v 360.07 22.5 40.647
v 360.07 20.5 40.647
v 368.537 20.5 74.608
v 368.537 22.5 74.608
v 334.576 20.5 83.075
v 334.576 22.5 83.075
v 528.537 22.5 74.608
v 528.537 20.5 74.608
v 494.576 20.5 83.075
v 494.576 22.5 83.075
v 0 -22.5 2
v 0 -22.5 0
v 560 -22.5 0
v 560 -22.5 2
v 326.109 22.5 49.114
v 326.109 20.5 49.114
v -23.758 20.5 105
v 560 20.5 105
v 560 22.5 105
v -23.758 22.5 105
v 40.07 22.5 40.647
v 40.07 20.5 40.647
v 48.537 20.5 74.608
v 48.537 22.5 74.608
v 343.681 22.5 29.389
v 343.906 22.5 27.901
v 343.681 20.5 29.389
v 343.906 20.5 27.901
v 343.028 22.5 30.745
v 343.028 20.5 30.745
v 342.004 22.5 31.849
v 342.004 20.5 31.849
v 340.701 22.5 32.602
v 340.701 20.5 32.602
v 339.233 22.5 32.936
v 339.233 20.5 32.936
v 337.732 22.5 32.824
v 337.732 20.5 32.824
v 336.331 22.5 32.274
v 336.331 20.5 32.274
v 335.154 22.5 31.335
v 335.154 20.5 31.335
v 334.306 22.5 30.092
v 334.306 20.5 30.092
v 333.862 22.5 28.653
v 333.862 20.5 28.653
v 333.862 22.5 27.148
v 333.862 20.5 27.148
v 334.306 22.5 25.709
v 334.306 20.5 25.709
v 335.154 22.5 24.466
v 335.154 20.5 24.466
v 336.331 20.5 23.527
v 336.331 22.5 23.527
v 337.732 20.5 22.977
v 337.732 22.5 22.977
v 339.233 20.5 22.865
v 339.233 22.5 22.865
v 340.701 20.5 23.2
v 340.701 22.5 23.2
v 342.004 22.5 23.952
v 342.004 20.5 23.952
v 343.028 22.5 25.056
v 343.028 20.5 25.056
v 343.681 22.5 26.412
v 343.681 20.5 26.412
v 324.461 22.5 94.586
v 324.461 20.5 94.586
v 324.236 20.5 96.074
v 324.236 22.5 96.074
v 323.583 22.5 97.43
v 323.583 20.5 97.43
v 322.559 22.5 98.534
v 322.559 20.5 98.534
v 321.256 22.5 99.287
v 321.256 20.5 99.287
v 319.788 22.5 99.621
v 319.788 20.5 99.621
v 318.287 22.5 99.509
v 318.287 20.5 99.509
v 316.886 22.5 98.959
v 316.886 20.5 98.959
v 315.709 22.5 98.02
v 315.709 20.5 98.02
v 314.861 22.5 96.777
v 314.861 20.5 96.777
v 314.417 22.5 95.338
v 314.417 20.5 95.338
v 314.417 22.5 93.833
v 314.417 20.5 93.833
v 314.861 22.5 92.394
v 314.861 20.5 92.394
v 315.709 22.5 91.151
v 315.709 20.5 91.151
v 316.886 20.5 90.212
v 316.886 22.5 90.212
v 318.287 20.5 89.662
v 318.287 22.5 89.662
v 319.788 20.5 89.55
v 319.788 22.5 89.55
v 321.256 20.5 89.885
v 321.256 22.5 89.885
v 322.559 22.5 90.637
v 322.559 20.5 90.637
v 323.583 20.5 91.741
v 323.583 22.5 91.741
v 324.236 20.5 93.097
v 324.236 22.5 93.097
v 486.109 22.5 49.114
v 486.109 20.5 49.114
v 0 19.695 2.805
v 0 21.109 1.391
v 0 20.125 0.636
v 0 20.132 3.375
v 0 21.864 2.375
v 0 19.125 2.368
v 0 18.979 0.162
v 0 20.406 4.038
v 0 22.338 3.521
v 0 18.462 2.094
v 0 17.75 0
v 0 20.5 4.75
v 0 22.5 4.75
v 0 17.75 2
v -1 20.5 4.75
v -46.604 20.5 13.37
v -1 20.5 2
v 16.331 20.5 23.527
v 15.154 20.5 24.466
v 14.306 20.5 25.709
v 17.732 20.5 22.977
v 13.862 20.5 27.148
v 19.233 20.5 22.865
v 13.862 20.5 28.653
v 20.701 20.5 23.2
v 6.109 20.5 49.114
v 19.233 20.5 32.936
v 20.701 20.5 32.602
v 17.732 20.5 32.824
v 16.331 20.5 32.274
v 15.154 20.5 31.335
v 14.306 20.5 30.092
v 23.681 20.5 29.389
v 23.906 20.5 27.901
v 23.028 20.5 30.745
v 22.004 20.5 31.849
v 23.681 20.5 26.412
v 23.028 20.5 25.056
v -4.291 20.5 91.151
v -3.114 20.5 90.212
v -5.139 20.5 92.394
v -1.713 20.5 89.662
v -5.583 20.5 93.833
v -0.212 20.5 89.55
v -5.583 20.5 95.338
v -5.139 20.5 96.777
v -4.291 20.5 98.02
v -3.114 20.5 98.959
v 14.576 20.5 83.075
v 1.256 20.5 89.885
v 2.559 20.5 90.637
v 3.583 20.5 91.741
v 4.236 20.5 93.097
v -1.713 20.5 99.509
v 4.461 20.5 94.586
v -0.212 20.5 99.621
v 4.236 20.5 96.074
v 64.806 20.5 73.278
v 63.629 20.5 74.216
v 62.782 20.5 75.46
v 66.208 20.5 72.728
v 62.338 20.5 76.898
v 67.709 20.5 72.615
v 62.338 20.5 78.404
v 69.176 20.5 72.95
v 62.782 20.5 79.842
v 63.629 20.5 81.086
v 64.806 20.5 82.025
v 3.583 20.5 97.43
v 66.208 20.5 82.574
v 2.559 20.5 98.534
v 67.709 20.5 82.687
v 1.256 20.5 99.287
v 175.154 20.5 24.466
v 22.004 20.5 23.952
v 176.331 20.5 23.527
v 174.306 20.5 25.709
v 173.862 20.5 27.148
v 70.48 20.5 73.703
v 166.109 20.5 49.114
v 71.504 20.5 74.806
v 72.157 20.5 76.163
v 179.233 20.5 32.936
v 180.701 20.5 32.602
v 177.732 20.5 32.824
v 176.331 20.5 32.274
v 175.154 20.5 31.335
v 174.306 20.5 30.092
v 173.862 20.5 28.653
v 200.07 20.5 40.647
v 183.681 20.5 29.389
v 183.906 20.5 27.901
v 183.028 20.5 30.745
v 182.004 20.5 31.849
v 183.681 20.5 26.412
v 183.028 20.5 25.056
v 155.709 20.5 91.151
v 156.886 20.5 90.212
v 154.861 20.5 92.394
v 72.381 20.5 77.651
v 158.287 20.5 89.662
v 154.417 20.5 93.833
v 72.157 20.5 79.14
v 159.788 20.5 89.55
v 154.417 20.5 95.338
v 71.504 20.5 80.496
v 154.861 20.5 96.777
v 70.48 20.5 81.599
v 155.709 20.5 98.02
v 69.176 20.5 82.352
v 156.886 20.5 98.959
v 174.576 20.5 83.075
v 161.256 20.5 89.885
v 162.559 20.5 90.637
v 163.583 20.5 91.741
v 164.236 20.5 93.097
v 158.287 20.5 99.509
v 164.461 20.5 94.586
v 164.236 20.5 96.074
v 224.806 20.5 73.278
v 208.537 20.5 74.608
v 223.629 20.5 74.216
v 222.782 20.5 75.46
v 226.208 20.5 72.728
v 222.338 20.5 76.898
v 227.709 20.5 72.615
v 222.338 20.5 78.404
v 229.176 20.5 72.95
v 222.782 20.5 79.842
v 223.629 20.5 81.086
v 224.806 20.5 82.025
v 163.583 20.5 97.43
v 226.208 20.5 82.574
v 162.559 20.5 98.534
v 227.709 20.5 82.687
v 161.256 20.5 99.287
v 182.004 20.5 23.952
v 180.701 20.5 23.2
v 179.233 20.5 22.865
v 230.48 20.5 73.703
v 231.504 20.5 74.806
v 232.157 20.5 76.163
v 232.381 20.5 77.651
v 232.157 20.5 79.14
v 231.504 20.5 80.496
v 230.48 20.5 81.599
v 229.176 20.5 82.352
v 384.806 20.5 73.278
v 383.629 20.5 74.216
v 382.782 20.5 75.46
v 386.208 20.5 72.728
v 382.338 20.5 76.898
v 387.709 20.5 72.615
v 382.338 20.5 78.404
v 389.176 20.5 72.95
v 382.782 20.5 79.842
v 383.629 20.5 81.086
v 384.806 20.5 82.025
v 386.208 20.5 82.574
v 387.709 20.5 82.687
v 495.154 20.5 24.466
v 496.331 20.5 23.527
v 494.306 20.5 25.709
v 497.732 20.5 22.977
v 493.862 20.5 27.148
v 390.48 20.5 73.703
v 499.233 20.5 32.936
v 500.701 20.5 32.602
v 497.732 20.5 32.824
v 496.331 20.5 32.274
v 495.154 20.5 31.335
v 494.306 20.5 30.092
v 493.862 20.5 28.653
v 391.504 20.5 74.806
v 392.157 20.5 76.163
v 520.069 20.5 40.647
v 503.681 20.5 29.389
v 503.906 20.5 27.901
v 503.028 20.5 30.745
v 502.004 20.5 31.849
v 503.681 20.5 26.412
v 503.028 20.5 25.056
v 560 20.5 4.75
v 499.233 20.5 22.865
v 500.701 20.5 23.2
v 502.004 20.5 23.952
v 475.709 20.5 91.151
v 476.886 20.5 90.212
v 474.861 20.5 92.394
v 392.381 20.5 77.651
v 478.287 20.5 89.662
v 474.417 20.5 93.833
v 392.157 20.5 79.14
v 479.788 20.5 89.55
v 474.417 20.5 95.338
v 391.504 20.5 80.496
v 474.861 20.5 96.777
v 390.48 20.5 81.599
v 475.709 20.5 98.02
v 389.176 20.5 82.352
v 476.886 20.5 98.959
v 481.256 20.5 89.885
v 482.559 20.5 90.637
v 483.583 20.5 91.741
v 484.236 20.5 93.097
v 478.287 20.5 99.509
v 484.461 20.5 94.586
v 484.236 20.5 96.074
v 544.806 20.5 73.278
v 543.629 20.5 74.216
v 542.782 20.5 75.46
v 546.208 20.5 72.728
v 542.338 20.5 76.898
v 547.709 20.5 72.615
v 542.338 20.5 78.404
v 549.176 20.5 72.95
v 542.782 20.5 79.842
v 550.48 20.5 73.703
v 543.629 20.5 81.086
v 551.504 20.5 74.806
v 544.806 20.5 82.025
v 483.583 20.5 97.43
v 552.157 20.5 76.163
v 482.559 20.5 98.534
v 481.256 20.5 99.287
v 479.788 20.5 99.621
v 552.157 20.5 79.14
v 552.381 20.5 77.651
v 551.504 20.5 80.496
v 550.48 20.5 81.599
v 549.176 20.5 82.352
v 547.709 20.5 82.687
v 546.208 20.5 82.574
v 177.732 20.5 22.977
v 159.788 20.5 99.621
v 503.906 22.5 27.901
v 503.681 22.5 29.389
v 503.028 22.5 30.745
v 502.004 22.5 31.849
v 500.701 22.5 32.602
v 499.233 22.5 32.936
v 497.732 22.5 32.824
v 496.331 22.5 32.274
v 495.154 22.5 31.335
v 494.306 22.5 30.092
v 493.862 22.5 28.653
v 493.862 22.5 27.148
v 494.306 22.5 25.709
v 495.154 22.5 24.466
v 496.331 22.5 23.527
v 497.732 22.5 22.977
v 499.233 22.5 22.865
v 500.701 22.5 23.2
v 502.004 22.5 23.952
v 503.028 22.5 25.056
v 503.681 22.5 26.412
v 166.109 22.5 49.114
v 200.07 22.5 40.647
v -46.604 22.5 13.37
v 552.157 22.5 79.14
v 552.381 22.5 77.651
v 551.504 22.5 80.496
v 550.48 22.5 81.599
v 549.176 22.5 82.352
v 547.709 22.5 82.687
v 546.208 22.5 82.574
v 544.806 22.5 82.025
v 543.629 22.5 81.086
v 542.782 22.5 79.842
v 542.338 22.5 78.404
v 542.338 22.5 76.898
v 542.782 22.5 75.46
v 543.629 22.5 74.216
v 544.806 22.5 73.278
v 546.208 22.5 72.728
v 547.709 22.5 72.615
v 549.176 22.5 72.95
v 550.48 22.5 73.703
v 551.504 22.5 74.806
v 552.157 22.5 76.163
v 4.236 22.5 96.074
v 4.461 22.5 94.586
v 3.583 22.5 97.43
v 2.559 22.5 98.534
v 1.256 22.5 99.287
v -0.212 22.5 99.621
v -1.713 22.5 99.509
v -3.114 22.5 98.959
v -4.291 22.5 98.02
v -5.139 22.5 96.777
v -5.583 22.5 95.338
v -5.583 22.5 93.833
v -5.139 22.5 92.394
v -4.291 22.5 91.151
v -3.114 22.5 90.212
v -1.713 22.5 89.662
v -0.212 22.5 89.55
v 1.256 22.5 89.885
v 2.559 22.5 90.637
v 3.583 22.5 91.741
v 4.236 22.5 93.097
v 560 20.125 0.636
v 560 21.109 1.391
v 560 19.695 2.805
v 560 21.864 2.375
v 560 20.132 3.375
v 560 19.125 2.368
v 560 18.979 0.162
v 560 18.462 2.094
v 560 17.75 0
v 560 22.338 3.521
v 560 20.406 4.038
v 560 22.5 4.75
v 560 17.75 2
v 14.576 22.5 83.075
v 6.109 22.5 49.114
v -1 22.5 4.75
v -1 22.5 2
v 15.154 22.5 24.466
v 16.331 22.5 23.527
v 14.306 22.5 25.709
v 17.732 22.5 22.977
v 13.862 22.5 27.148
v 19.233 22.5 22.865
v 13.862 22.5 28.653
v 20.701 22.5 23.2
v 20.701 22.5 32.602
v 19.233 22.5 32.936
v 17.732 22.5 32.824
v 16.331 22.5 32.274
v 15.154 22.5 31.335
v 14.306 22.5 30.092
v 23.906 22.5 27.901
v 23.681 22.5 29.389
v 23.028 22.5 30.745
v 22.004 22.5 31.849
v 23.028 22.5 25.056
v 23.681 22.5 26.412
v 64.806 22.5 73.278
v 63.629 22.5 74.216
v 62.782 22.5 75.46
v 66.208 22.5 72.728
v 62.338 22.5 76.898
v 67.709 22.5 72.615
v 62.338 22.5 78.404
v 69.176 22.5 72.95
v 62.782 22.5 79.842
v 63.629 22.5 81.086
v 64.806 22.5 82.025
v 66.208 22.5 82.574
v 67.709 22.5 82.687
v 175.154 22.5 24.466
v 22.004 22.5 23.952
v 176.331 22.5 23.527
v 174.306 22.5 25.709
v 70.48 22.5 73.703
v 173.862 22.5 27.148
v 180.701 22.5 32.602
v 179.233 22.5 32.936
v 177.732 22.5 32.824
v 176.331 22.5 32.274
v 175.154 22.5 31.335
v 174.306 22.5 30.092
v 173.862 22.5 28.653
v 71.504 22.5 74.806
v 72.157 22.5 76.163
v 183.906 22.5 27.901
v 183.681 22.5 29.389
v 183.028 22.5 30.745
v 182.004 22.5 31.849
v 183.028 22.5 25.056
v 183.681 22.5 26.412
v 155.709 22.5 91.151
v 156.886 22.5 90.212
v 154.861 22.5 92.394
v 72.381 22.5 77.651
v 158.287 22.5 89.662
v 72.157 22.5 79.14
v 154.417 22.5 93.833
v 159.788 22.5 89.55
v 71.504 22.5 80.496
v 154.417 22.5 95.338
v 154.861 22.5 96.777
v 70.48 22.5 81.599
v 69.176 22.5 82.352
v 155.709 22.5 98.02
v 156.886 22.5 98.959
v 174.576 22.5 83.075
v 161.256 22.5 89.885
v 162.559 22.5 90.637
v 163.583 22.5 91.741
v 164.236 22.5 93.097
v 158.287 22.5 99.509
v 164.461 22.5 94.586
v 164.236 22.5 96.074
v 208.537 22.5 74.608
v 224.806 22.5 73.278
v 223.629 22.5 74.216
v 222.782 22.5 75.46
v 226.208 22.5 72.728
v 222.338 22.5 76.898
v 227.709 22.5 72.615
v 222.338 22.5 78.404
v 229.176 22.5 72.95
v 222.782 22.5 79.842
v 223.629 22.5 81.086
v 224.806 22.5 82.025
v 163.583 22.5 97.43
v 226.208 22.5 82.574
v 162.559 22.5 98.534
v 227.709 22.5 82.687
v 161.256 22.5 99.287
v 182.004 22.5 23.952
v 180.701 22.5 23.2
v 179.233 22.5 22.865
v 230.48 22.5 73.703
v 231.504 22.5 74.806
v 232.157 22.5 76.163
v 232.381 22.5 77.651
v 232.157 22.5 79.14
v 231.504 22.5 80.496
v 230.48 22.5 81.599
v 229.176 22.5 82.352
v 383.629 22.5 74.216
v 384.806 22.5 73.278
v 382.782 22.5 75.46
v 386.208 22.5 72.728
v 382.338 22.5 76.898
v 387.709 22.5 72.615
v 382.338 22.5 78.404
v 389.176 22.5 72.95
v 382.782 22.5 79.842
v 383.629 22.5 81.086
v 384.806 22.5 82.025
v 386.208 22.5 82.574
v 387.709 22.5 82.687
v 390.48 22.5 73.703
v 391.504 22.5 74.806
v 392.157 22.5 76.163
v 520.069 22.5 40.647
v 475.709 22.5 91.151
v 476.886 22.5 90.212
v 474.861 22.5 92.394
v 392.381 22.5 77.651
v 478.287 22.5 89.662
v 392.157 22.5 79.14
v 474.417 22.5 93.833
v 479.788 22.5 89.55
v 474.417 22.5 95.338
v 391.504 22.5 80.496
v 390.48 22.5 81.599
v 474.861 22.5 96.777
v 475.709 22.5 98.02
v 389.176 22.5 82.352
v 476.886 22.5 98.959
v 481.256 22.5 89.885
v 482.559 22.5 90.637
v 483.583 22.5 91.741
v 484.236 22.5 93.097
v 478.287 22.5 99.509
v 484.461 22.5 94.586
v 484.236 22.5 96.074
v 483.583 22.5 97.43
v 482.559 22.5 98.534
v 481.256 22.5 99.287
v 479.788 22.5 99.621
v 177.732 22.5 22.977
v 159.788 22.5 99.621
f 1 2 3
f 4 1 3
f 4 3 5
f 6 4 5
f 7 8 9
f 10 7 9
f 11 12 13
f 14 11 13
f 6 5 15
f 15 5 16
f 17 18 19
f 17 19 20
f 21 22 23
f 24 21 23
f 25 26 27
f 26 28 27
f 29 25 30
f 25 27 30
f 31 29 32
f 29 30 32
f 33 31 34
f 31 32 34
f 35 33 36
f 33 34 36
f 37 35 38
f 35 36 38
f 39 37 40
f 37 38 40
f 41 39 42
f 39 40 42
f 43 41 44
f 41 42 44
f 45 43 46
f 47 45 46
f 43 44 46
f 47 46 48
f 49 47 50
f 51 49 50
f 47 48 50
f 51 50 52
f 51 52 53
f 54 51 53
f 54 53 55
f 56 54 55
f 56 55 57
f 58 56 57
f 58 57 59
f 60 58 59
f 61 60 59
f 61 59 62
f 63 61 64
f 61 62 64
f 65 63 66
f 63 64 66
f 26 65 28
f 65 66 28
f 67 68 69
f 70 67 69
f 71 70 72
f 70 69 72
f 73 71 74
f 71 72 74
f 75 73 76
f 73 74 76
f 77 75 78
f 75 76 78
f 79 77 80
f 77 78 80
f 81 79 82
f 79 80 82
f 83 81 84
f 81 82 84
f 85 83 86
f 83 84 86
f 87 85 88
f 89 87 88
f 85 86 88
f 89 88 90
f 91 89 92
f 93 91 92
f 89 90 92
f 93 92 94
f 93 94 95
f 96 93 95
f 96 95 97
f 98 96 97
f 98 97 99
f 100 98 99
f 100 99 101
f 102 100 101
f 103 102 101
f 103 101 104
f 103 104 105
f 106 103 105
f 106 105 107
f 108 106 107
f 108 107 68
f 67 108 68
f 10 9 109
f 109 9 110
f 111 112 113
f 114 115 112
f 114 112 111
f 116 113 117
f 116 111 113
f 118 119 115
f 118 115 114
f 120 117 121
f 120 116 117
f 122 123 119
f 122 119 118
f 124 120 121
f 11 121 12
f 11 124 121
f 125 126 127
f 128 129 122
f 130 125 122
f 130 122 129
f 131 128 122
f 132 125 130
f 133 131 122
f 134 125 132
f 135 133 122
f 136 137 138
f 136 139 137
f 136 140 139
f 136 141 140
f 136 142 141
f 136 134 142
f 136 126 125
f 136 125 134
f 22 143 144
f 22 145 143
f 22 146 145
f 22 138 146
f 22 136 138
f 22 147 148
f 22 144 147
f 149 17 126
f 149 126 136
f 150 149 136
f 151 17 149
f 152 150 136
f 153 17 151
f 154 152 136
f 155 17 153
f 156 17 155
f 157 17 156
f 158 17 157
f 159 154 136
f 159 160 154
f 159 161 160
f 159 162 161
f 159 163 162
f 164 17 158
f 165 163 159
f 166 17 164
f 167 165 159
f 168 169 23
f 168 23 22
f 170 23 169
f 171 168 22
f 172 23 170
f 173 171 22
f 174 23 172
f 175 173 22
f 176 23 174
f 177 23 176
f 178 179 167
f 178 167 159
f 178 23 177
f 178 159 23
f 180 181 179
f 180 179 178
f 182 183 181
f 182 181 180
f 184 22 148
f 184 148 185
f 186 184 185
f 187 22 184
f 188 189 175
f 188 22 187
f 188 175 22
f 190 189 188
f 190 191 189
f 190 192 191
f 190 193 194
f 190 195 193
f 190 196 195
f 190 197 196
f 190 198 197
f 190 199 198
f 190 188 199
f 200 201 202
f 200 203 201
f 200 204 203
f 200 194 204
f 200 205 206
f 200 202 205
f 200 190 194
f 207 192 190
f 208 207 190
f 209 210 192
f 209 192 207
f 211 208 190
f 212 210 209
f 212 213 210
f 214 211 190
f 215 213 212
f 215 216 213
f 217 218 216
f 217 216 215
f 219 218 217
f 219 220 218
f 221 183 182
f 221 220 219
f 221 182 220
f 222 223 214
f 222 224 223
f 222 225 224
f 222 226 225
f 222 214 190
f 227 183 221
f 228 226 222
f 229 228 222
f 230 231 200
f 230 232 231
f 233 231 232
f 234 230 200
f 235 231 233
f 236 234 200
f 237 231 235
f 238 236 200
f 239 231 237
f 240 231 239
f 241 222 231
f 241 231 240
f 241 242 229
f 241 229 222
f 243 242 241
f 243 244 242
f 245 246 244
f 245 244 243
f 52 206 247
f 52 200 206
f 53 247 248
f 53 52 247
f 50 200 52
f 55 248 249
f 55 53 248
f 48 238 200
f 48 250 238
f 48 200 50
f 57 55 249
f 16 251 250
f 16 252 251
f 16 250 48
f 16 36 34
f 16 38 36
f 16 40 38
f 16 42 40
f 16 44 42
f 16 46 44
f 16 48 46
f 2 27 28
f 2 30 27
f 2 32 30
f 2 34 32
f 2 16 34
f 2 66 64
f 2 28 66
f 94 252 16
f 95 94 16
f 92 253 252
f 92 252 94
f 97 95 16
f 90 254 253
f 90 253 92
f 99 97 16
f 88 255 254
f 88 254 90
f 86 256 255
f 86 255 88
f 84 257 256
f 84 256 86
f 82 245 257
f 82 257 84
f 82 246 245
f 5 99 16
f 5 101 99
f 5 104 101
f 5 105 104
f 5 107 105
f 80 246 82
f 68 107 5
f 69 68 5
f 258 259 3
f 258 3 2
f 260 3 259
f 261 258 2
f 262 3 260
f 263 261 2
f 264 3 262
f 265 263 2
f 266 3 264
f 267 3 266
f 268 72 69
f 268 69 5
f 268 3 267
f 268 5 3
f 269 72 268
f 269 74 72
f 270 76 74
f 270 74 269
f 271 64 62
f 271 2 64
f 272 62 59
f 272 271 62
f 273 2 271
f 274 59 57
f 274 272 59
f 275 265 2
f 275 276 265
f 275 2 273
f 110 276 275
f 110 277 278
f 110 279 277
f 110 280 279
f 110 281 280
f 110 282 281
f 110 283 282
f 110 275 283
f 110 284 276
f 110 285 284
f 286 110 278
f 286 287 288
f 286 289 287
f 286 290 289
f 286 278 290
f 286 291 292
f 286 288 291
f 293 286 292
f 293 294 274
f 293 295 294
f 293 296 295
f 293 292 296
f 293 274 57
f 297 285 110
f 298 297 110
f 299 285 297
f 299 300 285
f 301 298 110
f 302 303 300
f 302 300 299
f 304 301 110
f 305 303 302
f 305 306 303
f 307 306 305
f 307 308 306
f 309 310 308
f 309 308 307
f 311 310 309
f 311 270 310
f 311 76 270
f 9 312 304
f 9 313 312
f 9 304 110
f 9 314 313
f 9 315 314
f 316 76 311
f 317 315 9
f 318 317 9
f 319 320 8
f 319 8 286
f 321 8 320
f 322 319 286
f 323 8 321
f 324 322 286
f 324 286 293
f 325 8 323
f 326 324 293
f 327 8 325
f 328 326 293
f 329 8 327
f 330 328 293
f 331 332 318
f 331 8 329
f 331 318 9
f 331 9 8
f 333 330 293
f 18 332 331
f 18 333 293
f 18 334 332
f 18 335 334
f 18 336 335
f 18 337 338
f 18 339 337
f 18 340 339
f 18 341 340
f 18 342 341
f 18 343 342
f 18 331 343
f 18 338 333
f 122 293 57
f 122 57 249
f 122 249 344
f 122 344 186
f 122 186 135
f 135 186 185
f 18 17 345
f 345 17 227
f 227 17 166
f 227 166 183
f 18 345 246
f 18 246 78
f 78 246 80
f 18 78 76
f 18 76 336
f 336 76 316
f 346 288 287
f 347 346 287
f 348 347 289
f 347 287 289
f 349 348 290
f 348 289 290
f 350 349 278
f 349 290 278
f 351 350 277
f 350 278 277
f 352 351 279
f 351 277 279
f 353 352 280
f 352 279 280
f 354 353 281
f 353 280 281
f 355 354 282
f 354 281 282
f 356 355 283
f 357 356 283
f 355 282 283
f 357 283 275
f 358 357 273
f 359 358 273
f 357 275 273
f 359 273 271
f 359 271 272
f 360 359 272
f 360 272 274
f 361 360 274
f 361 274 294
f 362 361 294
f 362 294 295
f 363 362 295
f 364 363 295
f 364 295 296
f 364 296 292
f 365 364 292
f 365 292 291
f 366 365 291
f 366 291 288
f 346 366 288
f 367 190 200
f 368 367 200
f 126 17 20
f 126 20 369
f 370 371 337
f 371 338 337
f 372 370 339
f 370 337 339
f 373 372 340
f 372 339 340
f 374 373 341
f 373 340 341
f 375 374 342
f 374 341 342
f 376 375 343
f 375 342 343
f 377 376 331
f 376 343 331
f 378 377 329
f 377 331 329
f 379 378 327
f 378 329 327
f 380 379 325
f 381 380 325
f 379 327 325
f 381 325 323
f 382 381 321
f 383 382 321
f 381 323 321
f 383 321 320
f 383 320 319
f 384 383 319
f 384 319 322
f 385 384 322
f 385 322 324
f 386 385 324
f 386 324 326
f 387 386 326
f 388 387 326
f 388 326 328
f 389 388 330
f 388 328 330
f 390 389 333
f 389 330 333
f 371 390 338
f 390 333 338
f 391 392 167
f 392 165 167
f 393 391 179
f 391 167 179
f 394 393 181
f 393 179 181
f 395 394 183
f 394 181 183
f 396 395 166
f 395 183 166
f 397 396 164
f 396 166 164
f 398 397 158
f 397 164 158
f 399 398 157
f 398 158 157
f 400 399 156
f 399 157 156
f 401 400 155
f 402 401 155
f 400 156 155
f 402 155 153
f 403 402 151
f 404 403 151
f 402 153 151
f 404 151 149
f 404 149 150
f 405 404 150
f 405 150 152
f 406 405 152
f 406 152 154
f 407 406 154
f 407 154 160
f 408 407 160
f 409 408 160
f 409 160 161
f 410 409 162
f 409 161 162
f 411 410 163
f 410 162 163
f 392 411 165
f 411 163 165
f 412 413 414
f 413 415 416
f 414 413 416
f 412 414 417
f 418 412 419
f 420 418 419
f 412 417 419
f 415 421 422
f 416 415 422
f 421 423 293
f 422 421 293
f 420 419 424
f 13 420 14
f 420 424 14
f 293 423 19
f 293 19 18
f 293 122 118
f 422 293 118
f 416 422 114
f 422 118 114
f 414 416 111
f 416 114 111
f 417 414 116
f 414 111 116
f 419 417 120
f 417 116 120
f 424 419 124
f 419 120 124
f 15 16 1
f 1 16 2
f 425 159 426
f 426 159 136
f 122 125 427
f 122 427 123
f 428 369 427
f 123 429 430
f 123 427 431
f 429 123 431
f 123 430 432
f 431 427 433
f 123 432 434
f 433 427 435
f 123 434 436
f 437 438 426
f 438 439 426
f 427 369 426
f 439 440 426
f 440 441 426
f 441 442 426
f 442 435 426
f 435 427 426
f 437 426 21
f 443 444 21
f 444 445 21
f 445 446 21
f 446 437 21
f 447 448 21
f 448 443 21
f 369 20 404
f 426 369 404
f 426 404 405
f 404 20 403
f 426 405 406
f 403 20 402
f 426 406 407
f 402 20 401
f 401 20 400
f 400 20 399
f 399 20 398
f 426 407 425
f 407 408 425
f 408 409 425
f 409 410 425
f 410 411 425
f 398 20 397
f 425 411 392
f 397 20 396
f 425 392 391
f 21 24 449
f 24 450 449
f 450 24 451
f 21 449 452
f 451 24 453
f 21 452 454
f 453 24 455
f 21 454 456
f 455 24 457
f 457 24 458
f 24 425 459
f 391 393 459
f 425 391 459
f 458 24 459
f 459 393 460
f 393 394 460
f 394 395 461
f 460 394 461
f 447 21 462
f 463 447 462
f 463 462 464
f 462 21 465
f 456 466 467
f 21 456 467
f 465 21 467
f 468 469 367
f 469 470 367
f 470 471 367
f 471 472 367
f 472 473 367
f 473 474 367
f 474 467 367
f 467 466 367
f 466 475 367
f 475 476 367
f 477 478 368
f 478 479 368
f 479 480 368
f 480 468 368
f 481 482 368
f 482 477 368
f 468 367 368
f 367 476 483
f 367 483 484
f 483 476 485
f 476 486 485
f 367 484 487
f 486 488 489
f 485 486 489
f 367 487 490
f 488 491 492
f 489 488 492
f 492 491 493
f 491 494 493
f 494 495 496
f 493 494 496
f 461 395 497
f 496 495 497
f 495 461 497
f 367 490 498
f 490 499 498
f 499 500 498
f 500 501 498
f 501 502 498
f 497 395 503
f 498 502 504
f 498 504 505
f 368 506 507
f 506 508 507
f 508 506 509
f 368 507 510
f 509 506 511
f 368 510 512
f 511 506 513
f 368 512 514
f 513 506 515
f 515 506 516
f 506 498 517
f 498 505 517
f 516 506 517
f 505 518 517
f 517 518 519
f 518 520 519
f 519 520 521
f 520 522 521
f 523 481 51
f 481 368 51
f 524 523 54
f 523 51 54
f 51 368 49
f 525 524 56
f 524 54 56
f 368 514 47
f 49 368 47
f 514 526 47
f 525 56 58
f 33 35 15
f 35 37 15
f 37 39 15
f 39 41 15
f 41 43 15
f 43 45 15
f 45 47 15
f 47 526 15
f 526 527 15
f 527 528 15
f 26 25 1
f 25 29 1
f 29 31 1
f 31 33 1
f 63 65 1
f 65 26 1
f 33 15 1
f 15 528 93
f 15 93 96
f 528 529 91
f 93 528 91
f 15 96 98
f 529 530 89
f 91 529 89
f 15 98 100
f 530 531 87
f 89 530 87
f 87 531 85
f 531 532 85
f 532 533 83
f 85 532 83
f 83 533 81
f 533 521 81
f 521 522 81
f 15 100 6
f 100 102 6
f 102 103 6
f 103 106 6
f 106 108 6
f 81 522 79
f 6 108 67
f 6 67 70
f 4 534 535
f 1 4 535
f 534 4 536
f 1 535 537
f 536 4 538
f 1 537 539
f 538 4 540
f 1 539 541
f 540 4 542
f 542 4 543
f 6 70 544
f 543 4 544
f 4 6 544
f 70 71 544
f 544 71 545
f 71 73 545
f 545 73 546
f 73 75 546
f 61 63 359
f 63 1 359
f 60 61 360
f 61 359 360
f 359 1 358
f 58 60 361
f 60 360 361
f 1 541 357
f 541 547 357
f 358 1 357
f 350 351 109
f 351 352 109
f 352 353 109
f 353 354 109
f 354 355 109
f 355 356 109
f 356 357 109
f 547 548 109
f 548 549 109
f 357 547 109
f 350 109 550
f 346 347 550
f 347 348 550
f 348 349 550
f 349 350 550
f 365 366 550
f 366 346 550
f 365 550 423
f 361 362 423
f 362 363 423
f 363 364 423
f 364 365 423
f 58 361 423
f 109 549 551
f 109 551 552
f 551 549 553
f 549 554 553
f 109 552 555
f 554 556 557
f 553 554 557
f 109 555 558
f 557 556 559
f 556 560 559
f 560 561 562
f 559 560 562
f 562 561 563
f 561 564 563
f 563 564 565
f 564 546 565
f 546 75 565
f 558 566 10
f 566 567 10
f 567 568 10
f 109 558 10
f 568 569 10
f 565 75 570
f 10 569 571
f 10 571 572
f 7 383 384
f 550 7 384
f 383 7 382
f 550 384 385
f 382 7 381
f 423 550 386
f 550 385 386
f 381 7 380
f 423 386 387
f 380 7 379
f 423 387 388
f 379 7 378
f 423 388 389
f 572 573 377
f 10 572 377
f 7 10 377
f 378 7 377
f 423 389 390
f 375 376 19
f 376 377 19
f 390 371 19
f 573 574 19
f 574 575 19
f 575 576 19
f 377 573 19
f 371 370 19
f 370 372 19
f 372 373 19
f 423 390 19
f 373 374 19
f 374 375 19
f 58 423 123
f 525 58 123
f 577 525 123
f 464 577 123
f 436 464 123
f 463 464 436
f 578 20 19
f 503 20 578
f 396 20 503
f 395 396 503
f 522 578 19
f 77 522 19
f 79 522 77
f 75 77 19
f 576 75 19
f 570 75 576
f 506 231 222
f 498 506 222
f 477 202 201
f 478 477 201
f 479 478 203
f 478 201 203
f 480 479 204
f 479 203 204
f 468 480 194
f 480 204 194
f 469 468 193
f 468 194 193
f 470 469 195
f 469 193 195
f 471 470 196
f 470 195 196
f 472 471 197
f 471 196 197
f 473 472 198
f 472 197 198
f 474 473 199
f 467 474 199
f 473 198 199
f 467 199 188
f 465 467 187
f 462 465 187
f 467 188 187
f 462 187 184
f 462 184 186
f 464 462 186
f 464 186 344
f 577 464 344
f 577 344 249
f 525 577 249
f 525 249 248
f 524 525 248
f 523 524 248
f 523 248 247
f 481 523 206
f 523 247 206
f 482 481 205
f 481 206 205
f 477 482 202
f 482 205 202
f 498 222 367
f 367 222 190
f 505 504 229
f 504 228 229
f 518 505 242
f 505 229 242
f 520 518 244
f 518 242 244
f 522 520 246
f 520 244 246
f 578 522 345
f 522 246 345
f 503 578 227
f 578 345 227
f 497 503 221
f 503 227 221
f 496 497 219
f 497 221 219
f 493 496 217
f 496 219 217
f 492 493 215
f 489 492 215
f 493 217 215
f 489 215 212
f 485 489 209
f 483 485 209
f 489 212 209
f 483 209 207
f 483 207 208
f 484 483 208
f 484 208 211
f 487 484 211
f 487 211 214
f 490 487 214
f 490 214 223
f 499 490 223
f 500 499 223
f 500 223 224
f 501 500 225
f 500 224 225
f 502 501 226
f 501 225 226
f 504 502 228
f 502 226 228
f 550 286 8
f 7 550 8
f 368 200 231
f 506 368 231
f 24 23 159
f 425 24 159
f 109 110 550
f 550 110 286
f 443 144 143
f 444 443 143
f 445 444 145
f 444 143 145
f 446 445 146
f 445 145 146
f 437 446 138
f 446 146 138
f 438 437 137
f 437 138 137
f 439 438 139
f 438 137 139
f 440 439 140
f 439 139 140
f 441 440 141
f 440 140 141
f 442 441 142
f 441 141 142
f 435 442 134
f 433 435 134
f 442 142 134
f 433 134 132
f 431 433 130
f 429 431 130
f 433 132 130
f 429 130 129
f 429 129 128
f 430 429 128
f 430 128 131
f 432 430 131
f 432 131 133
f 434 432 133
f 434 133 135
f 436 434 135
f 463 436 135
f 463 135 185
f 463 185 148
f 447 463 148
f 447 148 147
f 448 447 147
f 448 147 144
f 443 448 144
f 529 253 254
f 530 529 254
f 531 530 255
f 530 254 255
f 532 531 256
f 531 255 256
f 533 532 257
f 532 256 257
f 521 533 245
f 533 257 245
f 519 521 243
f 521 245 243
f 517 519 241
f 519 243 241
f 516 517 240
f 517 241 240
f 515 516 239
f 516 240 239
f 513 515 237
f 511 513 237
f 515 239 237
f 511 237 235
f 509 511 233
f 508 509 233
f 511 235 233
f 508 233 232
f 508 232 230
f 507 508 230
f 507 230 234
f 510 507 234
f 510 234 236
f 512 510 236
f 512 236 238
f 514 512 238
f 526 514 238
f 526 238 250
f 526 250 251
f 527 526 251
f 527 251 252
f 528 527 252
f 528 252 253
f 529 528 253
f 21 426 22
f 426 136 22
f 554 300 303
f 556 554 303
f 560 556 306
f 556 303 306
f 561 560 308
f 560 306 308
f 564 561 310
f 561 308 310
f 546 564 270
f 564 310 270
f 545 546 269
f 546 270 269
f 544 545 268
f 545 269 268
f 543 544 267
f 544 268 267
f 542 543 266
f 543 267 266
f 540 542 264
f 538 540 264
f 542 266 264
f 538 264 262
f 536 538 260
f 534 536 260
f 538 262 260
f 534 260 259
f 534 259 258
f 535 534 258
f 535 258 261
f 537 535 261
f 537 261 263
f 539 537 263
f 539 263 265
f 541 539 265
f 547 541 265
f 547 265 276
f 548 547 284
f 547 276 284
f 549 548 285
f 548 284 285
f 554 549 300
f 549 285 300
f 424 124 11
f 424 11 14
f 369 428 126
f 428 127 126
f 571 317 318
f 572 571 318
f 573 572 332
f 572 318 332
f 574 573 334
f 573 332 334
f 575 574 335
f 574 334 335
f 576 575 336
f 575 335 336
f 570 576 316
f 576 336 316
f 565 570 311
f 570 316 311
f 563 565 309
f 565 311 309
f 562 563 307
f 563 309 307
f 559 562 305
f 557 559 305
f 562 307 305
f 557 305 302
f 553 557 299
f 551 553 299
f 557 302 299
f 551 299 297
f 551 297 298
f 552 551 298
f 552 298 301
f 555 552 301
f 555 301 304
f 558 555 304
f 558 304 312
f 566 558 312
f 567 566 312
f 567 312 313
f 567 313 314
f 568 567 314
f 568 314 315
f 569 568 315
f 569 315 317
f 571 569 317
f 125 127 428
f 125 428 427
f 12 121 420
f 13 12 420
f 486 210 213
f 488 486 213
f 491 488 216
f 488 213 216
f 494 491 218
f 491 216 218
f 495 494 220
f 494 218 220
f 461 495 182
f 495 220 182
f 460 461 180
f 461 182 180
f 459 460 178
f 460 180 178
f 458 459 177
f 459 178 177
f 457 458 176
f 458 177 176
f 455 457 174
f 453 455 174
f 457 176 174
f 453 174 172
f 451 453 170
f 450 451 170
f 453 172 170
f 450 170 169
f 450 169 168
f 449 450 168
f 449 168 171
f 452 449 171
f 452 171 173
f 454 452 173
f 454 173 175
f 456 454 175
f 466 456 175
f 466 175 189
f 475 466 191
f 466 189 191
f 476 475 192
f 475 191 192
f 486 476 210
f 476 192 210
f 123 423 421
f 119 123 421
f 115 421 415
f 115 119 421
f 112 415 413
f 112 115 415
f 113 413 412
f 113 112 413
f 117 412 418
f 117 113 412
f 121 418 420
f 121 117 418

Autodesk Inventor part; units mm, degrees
ref_plane "YZ Plane" through (0, 0, 0) normal (1, 0, 0) x (0, 1, 0)
ref_plane "XZ Plane" through (0, 0, 0) normal (0, 1, 0) x (-1, 0, 0)
ref_plane "XY Plane" through (0, 0, 0) normal (0, 0, 1) x (1, 0, 0)
sketch "Sketch1" plane through (0, 0, 0) normal (0, 0, 1) x (1, 0, 0)
  line L0 (0, -22.5) -> (560, -22.5)
  line L1 (560, -22.5) -> (560, 22.5)
  line L2 (560, 22.5) -> (0, 22.5)
  line L3 (0, 22.5) -> (0, -22.5)
  line L4 (0, -22.5) -> (560, 22.5) construction
  line L5 (560, -22.5) -> (0, 22.5) construction
  point P0 (0, 0)
  point P1 (0, 0)
  dimension "d154" = 560
  dimension "d155" = 45
extrude "Plate3" add sketch "Sketch1" along normal blind 2
sketch "Sketch7" plane through (0, 20.5, 0) normal (0, 1, 0) x (-1, 0, 0)
  line L0 (-560, 0) -> (0, 0)
  line L1 (0, 0) -> (0, 105)
  line L2 (0, 105) -> (-560, 105)
  line L3 (-560, 105) -> (-560, 0)
edge flange "Flange3" height 105 angle 90 thickness 2 bend radius 2.75 thickness toward (0, 1, 0) relief round relief width 2 relief depth 1 edges at (280, 22.5, 2) wall of the first edge with corners at (560, 20.5, 0) (0, 20.5, 0) (0, 20.5, 105) (560, 20.5, 105)
bend "Bend3"
corner "Corner3"
sketch "Sketch11" plane through (0, 20.5, 105) normal (0, -1, 0) x (1, 0, 0)
  line L0 (0, -100.25) -> (560, -100.25) projected
  line L1 (560, -100.25) -> (560, 0) projected
  line L2 (560, 0) -> (0, 0) projected
  line L3 (0, -100.25) -> (0, 0) projected
  line L4 (0, 0) -> (-23.7581, 0)
  line L5 (-23.7581, 0) -> (-49.4388, -103)
  line L6 (-49.4388, -103) -> (-1, -103)
  line L7 (-1, -103) -> (-1, -100.25)
  line L8 (-1, -100.25) -> (0, -100.25)
  line L9 (560, -103) -> (0, -103) projected
  line L10 (-1, -103) -> (-46.6039, -91.6297)
  point P0 (0, -105)
  dimension "d193" = 1
  dimension "d194" = 23.7581
  dimension "d195" = 14
  dimension "d203" = 47
extrude "Extrusion6" add sketch "Sketch11" against normal up to surface (2 mm away) contours L8 L7 L10 L5 L4 L3
sketch "Sketch12" plane through (560, 20.5, 4.75) normal (0, -1, 0) x (1, 0, 0)
  line L0 (-511.4632, 69.8575) -> (-545.4236, 78.3248)
  line L1 (-545.4236, 78.3248) -> (-553.8908, 44.3644)
  line L2 (-553.8908, 44.3644) -> (-519.9305, 35.8972)
  line L3 (-519.9305, 35.8972) -> (-511.4632, 69.8575)
  line L4 (-511.4632, 69.8575) -> (-553.8908, 44.3644) construction
  line L5 (-545.4236, 78.3248) -> (-519.9305, 35.8972) construction
  circle A0 centre (-541.1443, 23.1506) radius 5.05
  circle A1 centre (-492.6686, 72.9011) radius 5.05
  circle A2 centre (-560.5893, 89.8356) radius 5.05
  line L6 (-492.6686, 72.9011) -> (-560.5893, 89.8356) construction
  line L7 (-560.5893, 89.8356) -> (-541.1443, 23.1506) construction
  line L8 (-541.1443, 23.1506) -> (-492.6686, 72.9011) construction
  line L9 (-528.4434, 74.0911) -> (-541.1443, 23.1506) construction
  line L10 (-583.7581, 100.25) -> (-606.6039, 8.6203) projected
  point P0 (-560, -4.75)
  point P1 (-532.677, 57.111)
  point P2 (-543.753, 12.6876)
  dimension "d206" = 35
  dimension "d207" = 35
  dimension "d208" = 10.1
  dimension "d209" = 70
  dimension "d210" = 60
  dimension "d211" = 25
  dimension "d213" = 12
  dimension "d214" = 60
extrude "Cut1" cut sketch "Sketch12" against normal blind 2
pattern_linear "Rectangular Pattern5" count 4 spacing 160 along (1, 0, 0) of "Cut1"
properties part number "MNT-CDF-501 box" material "Stainless Steel"
